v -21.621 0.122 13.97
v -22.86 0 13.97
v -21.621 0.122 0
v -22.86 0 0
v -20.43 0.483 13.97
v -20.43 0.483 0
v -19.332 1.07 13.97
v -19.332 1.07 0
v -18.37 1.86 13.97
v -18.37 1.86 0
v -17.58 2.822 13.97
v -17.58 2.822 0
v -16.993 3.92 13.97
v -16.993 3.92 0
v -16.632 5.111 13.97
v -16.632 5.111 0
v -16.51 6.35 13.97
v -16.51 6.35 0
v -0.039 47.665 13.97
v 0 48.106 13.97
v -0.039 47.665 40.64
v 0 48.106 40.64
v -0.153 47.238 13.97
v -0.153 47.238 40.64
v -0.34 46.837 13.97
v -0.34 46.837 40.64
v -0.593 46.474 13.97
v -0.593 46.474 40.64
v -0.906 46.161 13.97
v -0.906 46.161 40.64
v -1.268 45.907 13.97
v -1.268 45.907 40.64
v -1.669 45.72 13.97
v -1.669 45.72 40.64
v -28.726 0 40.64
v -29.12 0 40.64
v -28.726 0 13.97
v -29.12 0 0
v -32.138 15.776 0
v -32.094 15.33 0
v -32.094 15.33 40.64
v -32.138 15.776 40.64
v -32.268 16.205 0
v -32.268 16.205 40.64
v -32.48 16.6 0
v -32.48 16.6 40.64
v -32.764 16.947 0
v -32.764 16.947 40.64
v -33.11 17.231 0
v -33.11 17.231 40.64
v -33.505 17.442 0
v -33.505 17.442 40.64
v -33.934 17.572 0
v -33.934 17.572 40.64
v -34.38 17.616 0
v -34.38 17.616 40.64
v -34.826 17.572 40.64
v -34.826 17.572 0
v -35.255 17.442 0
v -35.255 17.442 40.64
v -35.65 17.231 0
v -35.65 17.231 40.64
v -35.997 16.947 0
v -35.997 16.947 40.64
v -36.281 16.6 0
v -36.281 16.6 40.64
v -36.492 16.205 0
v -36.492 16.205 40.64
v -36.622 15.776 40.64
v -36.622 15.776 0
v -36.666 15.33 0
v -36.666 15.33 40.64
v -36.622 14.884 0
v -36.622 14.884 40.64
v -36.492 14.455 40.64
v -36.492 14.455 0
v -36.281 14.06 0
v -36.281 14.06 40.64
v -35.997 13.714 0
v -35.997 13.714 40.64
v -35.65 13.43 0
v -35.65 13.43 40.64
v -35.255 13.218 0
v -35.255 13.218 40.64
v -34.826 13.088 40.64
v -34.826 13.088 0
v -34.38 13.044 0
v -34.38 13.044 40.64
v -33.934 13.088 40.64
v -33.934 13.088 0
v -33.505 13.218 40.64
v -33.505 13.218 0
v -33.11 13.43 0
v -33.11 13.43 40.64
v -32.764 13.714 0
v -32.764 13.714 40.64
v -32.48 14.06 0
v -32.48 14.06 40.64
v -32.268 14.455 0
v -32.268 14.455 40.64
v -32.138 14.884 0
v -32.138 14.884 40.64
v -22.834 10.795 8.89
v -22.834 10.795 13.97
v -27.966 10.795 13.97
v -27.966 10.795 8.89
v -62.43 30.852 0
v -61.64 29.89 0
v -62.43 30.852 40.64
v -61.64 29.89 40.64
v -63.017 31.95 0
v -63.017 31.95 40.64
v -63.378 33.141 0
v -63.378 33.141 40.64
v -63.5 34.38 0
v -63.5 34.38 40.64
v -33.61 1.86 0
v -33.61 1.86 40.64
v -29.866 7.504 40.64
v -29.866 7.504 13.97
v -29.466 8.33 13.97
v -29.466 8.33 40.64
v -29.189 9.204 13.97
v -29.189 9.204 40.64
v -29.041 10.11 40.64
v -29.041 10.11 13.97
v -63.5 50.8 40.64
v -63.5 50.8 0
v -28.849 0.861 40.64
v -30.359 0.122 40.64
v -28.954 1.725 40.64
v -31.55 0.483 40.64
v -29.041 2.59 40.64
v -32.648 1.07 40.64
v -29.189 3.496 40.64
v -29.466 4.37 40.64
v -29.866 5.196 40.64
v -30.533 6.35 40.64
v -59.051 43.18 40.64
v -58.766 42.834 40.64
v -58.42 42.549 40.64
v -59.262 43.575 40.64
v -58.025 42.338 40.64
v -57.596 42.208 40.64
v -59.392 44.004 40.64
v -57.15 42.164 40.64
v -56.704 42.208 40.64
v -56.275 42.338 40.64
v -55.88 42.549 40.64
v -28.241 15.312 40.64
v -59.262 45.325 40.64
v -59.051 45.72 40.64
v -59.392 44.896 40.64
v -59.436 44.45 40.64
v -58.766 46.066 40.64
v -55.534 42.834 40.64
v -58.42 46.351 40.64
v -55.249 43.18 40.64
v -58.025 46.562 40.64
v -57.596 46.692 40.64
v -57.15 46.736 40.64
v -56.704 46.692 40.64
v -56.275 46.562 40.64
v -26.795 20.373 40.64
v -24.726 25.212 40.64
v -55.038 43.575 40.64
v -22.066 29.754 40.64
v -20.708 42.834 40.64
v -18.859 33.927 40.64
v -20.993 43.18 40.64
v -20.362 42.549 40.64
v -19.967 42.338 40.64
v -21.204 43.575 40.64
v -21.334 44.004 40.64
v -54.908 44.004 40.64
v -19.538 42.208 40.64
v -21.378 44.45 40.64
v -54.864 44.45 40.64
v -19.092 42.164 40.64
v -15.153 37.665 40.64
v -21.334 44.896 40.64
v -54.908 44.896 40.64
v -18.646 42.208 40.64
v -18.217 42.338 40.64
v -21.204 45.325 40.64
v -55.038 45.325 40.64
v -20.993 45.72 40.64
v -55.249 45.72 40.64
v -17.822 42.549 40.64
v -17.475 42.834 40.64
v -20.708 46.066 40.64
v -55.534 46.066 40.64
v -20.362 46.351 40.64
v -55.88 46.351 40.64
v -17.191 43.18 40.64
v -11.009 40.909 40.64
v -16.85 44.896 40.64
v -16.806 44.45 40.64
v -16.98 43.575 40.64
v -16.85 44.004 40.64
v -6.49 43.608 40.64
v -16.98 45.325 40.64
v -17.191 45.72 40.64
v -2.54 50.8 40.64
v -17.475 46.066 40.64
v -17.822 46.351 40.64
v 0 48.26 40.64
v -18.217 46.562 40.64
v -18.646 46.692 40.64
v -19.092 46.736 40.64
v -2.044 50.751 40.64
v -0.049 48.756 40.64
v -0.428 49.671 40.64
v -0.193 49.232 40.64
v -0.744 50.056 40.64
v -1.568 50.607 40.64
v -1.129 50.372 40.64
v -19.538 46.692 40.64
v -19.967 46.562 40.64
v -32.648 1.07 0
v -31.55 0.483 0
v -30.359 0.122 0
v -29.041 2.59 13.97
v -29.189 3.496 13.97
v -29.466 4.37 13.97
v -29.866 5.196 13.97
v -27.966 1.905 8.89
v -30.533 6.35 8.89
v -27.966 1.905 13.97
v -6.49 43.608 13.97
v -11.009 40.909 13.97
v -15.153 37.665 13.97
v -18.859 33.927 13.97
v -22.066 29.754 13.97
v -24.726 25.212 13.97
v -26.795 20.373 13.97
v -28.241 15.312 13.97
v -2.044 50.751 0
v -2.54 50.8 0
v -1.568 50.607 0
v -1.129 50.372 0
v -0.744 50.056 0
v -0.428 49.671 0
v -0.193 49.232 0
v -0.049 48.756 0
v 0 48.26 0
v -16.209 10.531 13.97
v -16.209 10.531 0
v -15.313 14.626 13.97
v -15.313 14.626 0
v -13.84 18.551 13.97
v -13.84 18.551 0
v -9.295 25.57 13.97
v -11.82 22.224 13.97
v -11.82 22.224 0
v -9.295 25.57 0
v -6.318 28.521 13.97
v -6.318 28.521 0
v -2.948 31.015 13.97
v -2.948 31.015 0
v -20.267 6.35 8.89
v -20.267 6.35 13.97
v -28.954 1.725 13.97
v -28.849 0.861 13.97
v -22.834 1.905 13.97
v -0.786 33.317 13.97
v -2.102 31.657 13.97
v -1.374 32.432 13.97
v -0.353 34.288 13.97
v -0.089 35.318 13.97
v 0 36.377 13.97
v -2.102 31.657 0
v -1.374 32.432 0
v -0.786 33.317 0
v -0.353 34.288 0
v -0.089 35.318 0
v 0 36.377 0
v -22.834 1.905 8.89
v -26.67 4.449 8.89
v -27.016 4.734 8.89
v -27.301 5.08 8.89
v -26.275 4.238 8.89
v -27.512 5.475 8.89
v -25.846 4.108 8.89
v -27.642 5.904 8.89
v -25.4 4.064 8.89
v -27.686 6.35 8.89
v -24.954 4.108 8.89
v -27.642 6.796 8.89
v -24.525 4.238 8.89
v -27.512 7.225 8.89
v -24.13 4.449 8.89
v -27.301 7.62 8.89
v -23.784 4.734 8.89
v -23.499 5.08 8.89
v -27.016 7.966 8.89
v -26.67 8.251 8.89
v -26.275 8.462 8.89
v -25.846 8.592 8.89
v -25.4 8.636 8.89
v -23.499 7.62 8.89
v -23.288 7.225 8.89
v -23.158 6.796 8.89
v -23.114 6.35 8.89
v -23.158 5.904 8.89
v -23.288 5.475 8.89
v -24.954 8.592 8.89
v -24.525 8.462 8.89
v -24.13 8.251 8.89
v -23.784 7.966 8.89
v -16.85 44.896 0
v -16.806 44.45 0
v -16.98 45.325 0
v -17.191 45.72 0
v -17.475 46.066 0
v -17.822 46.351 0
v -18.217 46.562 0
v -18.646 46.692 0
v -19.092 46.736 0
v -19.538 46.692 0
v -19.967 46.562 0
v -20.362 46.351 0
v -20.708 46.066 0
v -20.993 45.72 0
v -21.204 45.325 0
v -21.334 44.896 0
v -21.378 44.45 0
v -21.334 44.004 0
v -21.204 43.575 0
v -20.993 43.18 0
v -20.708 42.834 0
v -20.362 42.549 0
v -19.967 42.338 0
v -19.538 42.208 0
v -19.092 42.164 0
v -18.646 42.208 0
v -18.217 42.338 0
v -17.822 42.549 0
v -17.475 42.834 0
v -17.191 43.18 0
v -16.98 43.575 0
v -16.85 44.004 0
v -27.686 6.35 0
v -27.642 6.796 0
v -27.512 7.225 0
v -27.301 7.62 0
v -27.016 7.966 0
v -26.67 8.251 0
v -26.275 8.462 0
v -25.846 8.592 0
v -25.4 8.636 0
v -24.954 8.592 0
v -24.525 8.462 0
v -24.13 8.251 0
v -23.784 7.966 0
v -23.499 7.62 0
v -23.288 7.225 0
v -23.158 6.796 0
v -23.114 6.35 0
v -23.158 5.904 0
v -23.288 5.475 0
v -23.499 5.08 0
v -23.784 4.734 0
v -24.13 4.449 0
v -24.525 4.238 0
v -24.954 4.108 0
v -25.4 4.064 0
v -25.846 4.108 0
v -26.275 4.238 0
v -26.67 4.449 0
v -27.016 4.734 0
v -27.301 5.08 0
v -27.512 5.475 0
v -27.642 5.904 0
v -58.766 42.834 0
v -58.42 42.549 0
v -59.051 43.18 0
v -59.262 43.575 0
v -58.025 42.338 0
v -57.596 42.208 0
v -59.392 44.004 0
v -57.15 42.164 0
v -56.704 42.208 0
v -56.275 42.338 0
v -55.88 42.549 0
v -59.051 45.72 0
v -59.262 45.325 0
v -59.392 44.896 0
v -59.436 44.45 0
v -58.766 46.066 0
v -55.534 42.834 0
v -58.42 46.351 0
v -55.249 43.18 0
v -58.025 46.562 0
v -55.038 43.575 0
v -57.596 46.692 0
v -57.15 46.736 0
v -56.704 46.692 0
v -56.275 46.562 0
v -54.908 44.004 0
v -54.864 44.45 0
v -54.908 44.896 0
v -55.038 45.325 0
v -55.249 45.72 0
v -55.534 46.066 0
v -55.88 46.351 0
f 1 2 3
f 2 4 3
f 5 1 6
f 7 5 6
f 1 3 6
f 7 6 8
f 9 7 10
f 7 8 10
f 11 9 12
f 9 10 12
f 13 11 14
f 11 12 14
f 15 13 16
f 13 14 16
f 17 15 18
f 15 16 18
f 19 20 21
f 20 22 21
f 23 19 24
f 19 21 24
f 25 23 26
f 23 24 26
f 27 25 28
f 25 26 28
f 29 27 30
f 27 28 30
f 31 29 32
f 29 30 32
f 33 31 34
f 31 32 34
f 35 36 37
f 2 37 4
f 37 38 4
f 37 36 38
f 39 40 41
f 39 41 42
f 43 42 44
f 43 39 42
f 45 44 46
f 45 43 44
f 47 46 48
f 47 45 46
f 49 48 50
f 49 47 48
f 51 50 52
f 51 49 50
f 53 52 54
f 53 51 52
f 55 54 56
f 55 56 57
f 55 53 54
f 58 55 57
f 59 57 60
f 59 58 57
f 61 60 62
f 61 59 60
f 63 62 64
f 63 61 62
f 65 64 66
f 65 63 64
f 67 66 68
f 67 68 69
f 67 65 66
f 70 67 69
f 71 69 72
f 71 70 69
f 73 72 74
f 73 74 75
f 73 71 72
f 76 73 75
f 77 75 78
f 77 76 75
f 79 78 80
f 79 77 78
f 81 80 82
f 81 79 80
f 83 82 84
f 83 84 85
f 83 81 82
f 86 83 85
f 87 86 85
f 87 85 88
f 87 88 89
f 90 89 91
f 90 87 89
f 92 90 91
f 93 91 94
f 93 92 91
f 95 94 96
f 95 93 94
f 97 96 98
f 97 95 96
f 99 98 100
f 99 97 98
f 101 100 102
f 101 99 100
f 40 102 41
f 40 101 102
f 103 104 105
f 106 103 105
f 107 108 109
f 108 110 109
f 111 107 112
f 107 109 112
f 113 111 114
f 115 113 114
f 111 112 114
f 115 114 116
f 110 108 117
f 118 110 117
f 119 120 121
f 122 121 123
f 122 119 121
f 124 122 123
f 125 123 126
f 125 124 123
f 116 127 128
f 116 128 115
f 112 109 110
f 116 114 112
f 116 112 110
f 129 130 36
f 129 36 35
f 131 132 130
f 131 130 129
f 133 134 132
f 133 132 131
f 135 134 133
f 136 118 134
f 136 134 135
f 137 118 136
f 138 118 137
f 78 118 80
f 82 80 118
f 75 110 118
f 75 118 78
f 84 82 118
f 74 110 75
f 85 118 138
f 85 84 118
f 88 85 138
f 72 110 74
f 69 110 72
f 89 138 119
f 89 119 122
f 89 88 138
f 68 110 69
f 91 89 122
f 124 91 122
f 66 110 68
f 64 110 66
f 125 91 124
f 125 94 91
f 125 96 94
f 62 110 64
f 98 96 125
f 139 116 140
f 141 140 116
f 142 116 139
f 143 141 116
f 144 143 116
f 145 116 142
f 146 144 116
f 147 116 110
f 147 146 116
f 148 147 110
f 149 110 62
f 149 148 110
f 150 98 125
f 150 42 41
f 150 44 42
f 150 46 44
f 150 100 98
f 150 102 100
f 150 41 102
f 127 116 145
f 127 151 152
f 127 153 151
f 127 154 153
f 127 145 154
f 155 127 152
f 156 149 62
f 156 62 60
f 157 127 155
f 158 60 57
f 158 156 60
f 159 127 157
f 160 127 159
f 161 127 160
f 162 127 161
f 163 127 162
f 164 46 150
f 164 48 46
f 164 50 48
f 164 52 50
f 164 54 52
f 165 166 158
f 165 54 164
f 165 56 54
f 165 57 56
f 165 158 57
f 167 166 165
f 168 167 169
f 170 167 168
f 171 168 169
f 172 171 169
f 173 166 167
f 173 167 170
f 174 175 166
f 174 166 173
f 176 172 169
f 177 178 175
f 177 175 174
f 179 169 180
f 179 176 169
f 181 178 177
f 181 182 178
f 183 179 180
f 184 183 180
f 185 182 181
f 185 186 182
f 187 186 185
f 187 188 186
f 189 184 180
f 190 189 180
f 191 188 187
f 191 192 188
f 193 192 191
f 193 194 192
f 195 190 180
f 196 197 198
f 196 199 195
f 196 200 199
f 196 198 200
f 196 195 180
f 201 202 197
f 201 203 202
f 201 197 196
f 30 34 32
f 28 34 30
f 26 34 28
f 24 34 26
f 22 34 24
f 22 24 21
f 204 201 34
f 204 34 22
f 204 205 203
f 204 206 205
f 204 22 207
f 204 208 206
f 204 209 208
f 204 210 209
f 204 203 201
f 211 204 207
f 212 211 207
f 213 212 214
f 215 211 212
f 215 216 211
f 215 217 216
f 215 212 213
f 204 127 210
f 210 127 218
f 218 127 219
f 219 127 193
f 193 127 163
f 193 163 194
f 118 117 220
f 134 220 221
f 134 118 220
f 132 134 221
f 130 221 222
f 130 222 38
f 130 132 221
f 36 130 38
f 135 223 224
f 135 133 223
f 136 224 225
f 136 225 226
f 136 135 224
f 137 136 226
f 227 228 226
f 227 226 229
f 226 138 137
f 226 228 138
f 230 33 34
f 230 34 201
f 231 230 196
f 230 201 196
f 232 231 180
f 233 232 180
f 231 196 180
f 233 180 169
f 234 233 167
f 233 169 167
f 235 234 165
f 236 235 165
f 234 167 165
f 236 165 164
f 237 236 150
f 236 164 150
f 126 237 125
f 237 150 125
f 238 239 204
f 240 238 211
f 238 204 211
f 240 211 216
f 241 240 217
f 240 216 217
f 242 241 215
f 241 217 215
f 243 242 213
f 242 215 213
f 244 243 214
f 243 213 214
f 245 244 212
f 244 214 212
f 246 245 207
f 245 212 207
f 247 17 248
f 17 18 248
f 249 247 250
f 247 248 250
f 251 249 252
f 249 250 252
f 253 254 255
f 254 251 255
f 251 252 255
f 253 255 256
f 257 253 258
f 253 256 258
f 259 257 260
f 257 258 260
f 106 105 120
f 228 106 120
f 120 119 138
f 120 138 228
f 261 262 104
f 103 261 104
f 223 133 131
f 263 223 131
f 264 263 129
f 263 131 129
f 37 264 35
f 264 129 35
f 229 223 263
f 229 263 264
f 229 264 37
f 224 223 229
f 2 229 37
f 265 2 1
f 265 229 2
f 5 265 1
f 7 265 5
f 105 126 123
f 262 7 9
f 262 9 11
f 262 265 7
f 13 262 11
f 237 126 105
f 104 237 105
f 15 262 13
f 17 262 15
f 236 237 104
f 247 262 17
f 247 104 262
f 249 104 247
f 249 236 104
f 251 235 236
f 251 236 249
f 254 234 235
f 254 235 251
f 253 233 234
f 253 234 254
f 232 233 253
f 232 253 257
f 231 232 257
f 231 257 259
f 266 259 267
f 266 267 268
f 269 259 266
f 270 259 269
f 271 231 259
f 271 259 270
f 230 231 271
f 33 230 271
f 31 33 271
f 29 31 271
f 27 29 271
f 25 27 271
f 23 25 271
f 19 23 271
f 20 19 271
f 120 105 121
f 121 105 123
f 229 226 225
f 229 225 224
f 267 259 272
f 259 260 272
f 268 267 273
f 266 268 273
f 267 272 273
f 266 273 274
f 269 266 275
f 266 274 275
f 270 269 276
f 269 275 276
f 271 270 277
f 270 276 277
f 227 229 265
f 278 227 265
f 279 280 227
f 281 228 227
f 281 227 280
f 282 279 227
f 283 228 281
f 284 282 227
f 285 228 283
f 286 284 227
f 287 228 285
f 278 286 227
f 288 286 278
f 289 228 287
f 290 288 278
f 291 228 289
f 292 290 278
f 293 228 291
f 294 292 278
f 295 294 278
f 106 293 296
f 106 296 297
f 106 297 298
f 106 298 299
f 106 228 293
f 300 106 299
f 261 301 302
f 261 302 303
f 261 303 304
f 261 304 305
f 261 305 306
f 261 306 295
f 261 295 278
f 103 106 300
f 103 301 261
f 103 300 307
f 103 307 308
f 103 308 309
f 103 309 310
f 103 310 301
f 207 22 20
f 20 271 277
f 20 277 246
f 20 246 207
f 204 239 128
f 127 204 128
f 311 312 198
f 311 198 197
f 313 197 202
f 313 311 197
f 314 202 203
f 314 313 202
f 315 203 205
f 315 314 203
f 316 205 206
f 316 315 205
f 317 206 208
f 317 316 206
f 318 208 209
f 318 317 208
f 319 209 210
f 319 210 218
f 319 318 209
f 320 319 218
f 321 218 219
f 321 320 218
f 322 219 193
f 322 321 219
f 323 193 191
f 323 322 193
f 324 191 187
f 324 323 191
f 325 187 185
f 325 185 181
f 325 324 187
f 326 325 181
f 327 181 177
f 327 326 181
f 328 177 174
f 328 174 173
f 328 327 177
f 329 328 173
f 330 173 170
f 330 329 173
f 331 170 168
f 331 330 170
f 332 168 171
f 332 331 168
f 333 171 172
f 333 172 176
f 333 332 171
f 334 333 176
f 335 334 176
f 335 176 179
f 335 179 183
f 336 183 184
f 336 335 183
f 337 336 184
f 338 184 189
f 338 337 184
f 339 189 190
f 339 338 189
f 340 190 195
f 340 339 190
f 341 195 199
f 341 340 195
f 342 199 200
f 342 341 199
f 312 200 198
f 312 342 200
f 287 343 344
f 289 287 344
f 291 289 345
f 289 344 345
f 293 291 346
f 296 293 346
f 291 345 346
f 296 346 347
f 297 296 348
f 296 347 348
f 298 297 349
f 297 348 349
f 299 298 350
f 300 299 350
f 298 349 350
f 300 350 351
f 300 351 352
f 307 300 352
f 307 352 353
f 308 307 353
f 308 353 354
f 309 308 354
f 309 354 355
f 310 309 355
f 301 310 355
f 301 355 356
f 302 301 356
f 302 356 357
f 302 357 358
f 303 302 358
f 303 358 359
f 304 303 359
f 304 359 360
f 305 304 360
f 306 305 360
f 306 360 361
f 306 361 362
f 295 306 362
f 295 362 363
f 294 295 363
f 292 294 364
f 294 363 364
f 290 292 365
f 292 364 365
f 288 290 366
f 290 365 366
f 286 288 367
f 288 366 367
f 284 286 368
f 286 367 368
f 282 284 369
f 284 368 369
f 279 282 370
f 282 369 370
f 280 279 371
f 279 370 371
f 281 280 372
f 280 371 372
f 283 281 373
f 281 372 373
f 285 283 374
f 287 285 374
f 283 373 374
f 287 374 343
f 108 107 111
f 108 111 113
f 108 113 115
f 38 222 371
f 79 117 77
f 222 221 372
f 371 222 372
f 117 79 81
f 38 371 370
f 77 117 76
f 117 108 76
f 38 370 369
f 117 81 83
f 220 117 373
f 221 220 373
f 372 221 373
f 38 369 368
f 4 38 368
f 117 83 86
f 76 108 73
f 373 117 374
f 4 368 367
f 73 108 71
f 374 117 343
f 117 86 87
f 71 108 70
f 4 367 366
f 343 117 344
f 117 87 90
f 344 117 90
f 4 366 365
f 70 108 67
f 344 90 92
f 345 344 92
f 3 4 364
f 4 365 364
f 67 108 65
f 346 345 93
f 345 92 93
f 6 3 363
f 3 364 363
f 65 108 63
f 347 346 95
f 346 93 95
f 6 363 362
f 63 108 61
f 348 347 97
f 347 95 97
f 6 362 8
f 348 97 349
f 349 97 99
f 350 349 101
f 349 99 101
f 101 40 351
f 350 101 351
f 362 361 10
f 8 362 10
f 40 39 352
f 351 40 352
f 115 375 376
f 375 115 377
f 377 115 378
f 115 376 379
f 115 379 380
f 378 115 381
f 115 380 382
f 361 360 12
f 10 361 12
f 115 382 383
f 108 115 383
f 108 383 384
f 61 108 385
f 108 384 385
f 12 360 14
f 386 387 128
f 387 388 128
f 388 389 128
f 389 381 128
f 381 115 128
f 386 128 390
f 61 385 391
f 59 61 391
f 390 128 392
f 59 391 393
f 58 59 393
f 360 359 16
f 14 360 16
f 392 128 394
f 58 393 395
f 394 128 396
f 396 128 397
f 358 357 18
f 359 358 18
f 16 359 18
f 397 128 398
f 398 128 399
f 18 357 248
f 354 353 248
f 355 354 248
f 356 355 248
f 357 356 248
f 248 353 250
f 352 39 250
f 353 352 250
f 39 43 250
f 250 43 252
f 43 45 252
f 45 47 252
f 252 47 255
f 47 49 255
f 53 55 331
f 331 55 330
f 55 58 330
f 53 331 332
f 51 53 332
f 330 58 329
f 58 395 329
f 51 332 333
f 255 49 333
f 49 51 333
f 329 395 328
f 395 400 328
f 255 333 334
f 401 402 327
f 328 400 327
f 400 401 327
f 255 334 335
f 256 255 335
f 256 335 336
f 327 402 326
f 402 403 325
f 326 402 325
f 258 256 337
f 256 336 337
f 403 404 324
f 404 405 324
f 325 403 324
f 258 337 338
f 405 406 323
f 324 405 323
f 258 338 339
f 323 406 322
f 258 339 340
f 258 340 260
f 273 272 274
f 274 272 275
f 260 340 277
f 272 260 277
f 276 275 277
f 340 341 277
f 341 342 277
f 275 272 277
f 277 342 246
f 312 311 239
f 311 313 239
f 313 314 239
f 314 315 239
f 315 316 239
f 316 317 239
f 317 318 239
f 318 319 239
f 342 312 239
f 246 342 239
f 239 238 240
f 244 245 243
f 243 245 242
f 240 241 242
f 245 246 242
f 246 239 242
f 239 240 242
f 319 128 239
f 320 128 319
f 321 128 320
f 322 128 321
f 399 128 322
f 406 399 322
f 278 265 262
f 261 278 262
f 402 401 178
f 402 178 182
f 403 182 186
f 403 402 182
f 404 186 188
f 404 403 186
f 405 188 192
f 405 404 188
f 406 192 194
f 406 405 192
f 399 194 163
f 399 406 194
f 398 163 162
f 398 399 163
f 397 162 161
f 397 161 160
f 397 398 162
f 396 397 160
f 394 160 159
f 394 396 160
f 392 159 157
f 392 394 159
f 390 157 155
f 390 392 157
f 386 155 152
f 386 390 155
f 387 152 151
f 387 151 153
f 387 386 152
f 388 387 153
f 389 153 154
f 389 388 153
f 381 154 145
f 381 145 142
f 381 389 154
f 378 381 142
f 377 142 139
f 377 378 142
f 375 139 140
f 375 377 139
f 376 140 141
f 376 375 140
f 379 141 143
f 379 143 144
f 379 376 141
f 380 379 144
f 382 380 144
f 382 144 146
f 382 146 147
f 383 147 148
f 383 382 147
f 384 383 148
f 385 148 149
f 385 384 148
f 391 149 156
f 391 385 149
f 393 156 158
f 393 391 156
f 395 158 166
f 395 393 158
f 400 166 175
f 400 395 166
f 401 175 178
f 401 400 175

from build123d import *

# Parameters (mm, degrees)
SKETCH1_R           = 2.286
BOSS_EXTRUDE1_DEPTH = 40.64
SKETCH2_R           = 41.91
CUT_EXTRUDE1_DEPTH  = 26.67
SKETCH3_R           = 29.21
CUT_EXTRUDE2_DEPTH  = 91.909293254
SKETCH4_R           = 2.286
CUT_EXTRUDE3_DEPTH  = 91.909293254
CUT_EXTRUDE4_DEPTH  = 31.75
FILLET1_R           = 6.35
FILLET2_R           = 2.54
FILLET3_R           = 6.35


with BuildPart() as part:
    # Sketch1 → Boss-Extrude1 (new body)
    with BuildSketch(Plane.XY):
        Polygon((-63.5, 31.75), (-31.75, 0), (0, 0), (0, 50.8), (-63.5, 50.8), align=None)
        with Locations((-57.15, 44.45)):
            Circle(SKETCH1_R, mode=Mode.SUBTRACT)
        with Locations((-19.091771775, 44.45)):
            Circle(SKETCH1_R, mode=Mode.SUBTRACT)
        with Locations((-34.380256121, 15.330256121)):
            Circle(SKETCH1_R, mode=Mode.SUBTRACT)
    extrude(amount=BOSS_EXTRUDE1_DEPTH)

    # Sketch2 → Cut-Extrude1 (cut)
    with BuildSketch(Plane.XY.offset(40.64)):
        with Locations((12.7, 6.35)):
            Circle(SKETCH2_R)
    extrude(amount=-CUT_EXTRUDE1_DEPTH, mode=Mode.SUBTRACT)

    # Sketch3 → Cut-Extrude2 (cut, through all)
    with BuildSketch(Plane(origin=(0, 0, 0), x_dir=(-1, 0, 0), z_dir=(0, 0, -1))):
        with Locations((-12.7, 6.35)):
            Circle(SKETCH3_R)
    extrude(amount=-CUT_EXTRUDE2_DEPTH, mode=Mode.SUBTRACT)

    # Sketch4 → Cut-Extrude3 (cut, through all)
    with BuildSketch(Plane(origin=(0, 0, 0), x_dir=(-1, 0, 0), z_dir=(0, 0, -1))):
        with Locations((25.4, 6.35)):
            Circle(SKETCH4_R)
    extrude(amount=-CUT_EXTRUDE3_DEPTH, mode=Mode.SUBTRACT)

    # Sketch5 → Cut-Extrude4 (cut)
    with BuildSketch(Plane.XY.offset(40.64)):
        Polygon((-20.267356107, 6.35), (-22.833678053, 10.795), (-27.966321947, 10.795), (-30.532643893, 6.35), (-27.966321947, 1.905), (-22.833678053, 1.905), align=None)
    extrude(amount=-CUT_EXTRUDE4_DEPTH, mode=Mode.SUBTRACT)

    # Fillet1
    fillet1_edges = [part.edges().sort_by_distance(p)[0] for p in [
        (0, 32.654640275, 6.985),
        (-15.811429287, 0, 6.985),
        (-31.75, 0, 20.32),
        (-63.5, 31.75, 20.32),
    ]]
    fillet(fillet1_edges, radius=FILLET1_R)

    # Fillet2
    fillet2_edges = [part.edges().sort_by_distance(p)[0] for p in [
        (0, 46.289430392, 27.305),
        (0, 50.8, 20.32),
    ]]
    fillet(fillet2_edges, radius=FILLET2_R)

    # Fillet3
    fillet3_edges = [part.edges().sort_by_distance(p)[0] for p in [
        (-29.140585836, 3.938884718, 27.305),
        (-29.140585836, 8.761115282, 27.305),
    ]]
    fillet(fillet3_edges, radius=FILLET3_R)


solid = part.part
